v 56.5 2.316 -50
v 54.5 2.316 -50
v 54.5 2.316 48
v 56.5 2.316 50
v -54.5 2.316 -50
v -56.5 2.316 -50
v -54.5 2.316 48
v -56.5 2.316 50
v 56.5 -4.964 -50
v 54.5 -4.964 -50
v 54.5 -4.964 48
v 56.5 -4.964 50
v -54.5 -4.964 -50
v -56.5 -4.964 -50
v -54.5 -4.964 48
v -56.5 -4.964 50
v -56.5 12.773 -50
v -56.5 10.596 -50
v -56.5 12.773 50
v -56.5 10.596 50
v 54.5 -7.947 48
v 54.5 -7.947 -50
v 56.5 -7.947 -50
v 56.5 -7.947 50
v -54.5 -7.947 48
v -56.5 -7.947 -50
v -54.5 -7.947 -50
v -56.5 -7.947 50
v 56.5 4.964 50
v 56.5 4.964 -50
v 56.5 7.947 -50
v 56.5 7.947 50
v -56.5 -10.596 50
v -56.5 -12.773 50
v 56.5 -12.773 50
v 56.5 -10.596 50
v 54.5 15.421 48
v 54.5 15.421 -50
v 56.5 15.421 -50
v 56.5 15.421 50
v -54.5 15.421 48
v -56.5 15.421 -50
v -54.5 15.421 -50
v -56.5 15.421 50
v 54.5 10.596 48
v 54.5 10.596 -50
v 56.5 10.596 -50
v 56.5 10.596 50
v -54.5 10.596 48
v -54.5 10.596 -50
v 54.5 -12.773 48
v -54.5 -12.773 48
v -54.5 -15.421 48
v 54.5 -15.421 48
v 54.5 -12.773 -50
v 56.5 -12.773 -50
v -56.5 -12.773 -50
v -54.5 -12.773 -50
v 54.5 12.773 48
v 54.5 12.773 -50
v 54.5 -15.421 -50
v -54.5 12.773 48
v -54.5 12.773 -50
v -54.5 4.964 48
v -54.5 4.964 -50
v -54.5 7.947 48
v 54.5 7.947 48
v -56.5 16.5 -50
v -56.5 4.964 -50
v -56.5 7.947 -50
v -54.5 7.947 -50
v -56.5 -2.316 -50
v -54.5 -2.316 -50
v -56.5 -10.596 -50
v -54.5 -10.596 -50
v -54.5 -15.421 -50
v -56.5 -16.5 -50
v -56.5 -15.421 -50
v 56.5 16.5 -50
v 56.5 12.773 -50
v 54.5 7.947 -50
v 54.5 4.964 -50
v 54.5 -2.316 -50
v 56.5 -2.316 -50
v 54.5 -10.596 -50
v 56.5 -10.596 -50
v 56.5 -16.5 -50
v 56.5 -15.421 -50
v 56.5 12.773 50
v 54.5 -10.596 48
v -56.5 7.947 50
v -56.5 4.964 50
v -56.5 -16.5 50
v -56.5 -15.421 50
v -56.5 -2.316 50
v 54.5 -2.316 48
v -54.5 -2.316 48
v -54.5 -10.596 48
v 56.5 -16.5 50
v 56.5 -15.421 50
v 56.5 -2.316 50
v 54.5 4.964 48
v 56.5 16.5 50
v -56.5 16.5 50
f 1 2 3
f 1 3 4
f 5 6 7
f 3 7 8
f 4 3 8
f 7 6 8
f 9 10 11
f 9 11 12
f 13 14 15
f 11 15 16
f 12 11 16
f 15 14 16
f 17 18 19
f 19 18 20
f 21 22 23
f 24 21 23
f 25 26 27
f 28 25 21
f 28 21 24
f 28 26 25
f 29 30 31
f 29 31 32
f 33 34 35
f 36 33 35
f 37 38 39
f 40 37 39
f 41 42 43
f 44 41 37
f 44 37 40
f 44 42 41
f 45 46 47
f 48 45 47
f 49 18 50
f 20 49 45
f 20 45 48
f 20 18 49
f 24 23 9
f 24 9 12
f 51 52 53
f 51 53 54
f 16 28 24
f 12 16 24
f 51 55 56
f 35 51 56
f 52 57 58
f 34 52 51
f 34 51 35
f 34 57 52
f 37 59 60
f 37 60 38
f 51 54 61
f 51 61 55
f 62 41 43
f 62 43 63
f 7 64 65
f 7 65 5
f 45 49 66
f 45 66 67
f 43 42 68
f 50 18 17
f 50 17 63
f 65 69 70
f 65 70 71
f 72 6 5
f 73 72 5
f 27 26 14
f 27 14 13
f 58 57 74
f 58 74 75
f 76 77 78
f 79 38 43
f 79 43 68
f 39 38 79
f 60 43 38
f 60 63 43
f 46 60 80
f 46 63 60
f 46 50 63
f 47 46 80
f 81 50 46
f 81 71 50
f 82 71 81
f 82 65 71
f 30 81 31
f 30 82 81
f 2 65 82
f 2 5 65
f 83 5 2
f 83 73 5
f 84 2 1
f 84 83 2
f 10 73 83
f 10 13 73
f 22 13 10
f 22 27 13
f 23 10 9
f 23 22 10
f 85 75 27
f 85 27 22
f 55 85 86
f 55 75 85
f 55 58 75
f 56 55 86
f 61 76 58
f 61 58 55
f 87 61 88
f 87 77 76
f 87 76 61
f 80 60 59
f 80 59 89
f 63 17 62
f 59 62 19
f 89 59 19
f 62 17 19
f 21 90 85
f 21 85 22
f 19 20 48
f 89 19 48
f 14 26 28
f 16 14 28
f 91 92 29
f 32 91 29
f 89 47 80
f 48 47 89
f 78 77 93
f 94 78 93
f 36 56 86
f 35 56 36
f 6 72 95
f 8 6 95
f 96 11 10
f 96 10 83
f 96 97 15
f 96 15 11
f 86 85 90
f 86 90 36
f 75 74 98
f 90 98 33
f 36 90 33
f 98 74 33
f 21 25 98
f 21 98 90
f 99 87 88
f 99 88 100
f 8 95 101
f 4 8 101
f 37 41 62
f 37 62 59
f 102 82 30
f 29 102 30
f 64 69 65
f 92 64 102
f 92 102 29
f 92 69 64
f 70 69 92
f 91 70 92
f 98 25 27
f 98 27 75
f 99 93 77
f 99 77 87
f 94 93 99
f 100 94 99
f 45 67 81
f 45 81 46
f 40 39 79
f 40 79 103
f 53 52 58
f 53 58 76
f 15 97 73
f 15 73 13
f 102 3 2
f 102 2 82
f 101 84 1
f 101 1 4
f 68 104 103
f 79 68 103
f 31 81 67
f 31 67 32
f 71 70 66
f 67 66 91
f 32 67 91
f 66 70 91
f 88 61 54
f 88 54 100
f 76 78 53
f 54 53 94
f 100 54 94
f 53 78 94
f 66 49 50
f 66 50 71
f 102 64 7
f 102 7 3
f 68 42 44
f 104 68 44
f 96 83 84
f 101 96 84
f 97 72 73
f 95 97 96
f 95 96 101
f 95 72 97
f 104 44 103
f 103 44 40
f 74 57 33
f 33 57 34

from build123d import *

# Parameters (mm, degrees)
F0_W     = 113
F0_H     = 100
F1_DEPTH = 16.5
F2_W     = 113
F2_H     = 2.648482
F3_DEPTH = 2
F4_W     = 2.648482
F4_H     = 98
F5_DEPTH = 2
F6_W     = 2.648482
F6_H     = 98
F7_DEPTH = 2


with BuildPart() as f1:
    # F0 (on Front) → F1 (new body, symmetric)
    with BuildSketch(Plane.XZ):
        Rectangle(F0_W, F0_H)
    extrude(amount=F1_DEPTH, both=True)

    # F2 (on face) → F3 (cut)
    with BuildSketch(Plane.XY.offset(50)):
        with Locations((0, -14.097255)):
            Rectangle(F2_W, F2_H)
        with Locations((0, 14.097255)):
            Rectangle(F2_W, F2_H)
        with Locations((0, -9.271692)):
            Rectangle(F2_W, F2_H)
        with Locations((0, -3.639926)):
            Rectangle(F2_W, F2_H)
        with Locations((0, 3.639926)):
            Rectangle(F2_W, F2_H)
        with Locations((0, 9.271692)):
            Rectangle(F2_W, F2_H)
    extrude(amount=-F3_DEPTH, mode=Mode.SUBTRACT)

    # F4 (on face) → F5 (cut)
    with BuildSketch(Plane.YZ.offset(56.5)):
        with Locations((14.097255, -1)):
            Rectangle(F4_W, F4_H)
        with Locations((9.271692, -1)):
            Rectangle(F4_W, F4_H)
        with Locations((3.639926, -1)):
            Rectangle(F4_W, F4_H)
        with Locations((-3.639926, -1)):
            Rectangle(F4_W, F4_H)
        with Locations((-9.271692, -1)):
            Rectangle(F4_W, F4_H)
        with Locations((-14.097255, -1)):
            Rectangle(F4_W, F4_H)
    extrude(amount=-F5_DEPTH, mode=Mode.SUBTRACT)

    # F6 (on face) → F7 (cut)
    with BuildSketch(Plane(origin=(-56.5, 0, 0), x_dir=(0, -1, 0), z_dir=(-1, 0, 0))):
        with Locations((-14.097255, -1)):
            Rectangle(F6_W, F6_H)
        with Locations((-9.271692, -1)):
            Rectangle(F6_W, F6_H)
        with Locations((-3.639926, -1)):
            Rectangle(F6_W, F6_H)
        with Locations((3.639926, -1)):
            Rectangle(F6_W, F6_H)
        with Locations((9.271692, -1)):
            Rectangle(F6_W, F6_H)
        with Locations((14.097255, -1)):
            Rectangle(F6_W, F6_H)
    extrude(amount=-F7_DEPTH, mode=Mode.SUBTRACT)


solid = f1.part
